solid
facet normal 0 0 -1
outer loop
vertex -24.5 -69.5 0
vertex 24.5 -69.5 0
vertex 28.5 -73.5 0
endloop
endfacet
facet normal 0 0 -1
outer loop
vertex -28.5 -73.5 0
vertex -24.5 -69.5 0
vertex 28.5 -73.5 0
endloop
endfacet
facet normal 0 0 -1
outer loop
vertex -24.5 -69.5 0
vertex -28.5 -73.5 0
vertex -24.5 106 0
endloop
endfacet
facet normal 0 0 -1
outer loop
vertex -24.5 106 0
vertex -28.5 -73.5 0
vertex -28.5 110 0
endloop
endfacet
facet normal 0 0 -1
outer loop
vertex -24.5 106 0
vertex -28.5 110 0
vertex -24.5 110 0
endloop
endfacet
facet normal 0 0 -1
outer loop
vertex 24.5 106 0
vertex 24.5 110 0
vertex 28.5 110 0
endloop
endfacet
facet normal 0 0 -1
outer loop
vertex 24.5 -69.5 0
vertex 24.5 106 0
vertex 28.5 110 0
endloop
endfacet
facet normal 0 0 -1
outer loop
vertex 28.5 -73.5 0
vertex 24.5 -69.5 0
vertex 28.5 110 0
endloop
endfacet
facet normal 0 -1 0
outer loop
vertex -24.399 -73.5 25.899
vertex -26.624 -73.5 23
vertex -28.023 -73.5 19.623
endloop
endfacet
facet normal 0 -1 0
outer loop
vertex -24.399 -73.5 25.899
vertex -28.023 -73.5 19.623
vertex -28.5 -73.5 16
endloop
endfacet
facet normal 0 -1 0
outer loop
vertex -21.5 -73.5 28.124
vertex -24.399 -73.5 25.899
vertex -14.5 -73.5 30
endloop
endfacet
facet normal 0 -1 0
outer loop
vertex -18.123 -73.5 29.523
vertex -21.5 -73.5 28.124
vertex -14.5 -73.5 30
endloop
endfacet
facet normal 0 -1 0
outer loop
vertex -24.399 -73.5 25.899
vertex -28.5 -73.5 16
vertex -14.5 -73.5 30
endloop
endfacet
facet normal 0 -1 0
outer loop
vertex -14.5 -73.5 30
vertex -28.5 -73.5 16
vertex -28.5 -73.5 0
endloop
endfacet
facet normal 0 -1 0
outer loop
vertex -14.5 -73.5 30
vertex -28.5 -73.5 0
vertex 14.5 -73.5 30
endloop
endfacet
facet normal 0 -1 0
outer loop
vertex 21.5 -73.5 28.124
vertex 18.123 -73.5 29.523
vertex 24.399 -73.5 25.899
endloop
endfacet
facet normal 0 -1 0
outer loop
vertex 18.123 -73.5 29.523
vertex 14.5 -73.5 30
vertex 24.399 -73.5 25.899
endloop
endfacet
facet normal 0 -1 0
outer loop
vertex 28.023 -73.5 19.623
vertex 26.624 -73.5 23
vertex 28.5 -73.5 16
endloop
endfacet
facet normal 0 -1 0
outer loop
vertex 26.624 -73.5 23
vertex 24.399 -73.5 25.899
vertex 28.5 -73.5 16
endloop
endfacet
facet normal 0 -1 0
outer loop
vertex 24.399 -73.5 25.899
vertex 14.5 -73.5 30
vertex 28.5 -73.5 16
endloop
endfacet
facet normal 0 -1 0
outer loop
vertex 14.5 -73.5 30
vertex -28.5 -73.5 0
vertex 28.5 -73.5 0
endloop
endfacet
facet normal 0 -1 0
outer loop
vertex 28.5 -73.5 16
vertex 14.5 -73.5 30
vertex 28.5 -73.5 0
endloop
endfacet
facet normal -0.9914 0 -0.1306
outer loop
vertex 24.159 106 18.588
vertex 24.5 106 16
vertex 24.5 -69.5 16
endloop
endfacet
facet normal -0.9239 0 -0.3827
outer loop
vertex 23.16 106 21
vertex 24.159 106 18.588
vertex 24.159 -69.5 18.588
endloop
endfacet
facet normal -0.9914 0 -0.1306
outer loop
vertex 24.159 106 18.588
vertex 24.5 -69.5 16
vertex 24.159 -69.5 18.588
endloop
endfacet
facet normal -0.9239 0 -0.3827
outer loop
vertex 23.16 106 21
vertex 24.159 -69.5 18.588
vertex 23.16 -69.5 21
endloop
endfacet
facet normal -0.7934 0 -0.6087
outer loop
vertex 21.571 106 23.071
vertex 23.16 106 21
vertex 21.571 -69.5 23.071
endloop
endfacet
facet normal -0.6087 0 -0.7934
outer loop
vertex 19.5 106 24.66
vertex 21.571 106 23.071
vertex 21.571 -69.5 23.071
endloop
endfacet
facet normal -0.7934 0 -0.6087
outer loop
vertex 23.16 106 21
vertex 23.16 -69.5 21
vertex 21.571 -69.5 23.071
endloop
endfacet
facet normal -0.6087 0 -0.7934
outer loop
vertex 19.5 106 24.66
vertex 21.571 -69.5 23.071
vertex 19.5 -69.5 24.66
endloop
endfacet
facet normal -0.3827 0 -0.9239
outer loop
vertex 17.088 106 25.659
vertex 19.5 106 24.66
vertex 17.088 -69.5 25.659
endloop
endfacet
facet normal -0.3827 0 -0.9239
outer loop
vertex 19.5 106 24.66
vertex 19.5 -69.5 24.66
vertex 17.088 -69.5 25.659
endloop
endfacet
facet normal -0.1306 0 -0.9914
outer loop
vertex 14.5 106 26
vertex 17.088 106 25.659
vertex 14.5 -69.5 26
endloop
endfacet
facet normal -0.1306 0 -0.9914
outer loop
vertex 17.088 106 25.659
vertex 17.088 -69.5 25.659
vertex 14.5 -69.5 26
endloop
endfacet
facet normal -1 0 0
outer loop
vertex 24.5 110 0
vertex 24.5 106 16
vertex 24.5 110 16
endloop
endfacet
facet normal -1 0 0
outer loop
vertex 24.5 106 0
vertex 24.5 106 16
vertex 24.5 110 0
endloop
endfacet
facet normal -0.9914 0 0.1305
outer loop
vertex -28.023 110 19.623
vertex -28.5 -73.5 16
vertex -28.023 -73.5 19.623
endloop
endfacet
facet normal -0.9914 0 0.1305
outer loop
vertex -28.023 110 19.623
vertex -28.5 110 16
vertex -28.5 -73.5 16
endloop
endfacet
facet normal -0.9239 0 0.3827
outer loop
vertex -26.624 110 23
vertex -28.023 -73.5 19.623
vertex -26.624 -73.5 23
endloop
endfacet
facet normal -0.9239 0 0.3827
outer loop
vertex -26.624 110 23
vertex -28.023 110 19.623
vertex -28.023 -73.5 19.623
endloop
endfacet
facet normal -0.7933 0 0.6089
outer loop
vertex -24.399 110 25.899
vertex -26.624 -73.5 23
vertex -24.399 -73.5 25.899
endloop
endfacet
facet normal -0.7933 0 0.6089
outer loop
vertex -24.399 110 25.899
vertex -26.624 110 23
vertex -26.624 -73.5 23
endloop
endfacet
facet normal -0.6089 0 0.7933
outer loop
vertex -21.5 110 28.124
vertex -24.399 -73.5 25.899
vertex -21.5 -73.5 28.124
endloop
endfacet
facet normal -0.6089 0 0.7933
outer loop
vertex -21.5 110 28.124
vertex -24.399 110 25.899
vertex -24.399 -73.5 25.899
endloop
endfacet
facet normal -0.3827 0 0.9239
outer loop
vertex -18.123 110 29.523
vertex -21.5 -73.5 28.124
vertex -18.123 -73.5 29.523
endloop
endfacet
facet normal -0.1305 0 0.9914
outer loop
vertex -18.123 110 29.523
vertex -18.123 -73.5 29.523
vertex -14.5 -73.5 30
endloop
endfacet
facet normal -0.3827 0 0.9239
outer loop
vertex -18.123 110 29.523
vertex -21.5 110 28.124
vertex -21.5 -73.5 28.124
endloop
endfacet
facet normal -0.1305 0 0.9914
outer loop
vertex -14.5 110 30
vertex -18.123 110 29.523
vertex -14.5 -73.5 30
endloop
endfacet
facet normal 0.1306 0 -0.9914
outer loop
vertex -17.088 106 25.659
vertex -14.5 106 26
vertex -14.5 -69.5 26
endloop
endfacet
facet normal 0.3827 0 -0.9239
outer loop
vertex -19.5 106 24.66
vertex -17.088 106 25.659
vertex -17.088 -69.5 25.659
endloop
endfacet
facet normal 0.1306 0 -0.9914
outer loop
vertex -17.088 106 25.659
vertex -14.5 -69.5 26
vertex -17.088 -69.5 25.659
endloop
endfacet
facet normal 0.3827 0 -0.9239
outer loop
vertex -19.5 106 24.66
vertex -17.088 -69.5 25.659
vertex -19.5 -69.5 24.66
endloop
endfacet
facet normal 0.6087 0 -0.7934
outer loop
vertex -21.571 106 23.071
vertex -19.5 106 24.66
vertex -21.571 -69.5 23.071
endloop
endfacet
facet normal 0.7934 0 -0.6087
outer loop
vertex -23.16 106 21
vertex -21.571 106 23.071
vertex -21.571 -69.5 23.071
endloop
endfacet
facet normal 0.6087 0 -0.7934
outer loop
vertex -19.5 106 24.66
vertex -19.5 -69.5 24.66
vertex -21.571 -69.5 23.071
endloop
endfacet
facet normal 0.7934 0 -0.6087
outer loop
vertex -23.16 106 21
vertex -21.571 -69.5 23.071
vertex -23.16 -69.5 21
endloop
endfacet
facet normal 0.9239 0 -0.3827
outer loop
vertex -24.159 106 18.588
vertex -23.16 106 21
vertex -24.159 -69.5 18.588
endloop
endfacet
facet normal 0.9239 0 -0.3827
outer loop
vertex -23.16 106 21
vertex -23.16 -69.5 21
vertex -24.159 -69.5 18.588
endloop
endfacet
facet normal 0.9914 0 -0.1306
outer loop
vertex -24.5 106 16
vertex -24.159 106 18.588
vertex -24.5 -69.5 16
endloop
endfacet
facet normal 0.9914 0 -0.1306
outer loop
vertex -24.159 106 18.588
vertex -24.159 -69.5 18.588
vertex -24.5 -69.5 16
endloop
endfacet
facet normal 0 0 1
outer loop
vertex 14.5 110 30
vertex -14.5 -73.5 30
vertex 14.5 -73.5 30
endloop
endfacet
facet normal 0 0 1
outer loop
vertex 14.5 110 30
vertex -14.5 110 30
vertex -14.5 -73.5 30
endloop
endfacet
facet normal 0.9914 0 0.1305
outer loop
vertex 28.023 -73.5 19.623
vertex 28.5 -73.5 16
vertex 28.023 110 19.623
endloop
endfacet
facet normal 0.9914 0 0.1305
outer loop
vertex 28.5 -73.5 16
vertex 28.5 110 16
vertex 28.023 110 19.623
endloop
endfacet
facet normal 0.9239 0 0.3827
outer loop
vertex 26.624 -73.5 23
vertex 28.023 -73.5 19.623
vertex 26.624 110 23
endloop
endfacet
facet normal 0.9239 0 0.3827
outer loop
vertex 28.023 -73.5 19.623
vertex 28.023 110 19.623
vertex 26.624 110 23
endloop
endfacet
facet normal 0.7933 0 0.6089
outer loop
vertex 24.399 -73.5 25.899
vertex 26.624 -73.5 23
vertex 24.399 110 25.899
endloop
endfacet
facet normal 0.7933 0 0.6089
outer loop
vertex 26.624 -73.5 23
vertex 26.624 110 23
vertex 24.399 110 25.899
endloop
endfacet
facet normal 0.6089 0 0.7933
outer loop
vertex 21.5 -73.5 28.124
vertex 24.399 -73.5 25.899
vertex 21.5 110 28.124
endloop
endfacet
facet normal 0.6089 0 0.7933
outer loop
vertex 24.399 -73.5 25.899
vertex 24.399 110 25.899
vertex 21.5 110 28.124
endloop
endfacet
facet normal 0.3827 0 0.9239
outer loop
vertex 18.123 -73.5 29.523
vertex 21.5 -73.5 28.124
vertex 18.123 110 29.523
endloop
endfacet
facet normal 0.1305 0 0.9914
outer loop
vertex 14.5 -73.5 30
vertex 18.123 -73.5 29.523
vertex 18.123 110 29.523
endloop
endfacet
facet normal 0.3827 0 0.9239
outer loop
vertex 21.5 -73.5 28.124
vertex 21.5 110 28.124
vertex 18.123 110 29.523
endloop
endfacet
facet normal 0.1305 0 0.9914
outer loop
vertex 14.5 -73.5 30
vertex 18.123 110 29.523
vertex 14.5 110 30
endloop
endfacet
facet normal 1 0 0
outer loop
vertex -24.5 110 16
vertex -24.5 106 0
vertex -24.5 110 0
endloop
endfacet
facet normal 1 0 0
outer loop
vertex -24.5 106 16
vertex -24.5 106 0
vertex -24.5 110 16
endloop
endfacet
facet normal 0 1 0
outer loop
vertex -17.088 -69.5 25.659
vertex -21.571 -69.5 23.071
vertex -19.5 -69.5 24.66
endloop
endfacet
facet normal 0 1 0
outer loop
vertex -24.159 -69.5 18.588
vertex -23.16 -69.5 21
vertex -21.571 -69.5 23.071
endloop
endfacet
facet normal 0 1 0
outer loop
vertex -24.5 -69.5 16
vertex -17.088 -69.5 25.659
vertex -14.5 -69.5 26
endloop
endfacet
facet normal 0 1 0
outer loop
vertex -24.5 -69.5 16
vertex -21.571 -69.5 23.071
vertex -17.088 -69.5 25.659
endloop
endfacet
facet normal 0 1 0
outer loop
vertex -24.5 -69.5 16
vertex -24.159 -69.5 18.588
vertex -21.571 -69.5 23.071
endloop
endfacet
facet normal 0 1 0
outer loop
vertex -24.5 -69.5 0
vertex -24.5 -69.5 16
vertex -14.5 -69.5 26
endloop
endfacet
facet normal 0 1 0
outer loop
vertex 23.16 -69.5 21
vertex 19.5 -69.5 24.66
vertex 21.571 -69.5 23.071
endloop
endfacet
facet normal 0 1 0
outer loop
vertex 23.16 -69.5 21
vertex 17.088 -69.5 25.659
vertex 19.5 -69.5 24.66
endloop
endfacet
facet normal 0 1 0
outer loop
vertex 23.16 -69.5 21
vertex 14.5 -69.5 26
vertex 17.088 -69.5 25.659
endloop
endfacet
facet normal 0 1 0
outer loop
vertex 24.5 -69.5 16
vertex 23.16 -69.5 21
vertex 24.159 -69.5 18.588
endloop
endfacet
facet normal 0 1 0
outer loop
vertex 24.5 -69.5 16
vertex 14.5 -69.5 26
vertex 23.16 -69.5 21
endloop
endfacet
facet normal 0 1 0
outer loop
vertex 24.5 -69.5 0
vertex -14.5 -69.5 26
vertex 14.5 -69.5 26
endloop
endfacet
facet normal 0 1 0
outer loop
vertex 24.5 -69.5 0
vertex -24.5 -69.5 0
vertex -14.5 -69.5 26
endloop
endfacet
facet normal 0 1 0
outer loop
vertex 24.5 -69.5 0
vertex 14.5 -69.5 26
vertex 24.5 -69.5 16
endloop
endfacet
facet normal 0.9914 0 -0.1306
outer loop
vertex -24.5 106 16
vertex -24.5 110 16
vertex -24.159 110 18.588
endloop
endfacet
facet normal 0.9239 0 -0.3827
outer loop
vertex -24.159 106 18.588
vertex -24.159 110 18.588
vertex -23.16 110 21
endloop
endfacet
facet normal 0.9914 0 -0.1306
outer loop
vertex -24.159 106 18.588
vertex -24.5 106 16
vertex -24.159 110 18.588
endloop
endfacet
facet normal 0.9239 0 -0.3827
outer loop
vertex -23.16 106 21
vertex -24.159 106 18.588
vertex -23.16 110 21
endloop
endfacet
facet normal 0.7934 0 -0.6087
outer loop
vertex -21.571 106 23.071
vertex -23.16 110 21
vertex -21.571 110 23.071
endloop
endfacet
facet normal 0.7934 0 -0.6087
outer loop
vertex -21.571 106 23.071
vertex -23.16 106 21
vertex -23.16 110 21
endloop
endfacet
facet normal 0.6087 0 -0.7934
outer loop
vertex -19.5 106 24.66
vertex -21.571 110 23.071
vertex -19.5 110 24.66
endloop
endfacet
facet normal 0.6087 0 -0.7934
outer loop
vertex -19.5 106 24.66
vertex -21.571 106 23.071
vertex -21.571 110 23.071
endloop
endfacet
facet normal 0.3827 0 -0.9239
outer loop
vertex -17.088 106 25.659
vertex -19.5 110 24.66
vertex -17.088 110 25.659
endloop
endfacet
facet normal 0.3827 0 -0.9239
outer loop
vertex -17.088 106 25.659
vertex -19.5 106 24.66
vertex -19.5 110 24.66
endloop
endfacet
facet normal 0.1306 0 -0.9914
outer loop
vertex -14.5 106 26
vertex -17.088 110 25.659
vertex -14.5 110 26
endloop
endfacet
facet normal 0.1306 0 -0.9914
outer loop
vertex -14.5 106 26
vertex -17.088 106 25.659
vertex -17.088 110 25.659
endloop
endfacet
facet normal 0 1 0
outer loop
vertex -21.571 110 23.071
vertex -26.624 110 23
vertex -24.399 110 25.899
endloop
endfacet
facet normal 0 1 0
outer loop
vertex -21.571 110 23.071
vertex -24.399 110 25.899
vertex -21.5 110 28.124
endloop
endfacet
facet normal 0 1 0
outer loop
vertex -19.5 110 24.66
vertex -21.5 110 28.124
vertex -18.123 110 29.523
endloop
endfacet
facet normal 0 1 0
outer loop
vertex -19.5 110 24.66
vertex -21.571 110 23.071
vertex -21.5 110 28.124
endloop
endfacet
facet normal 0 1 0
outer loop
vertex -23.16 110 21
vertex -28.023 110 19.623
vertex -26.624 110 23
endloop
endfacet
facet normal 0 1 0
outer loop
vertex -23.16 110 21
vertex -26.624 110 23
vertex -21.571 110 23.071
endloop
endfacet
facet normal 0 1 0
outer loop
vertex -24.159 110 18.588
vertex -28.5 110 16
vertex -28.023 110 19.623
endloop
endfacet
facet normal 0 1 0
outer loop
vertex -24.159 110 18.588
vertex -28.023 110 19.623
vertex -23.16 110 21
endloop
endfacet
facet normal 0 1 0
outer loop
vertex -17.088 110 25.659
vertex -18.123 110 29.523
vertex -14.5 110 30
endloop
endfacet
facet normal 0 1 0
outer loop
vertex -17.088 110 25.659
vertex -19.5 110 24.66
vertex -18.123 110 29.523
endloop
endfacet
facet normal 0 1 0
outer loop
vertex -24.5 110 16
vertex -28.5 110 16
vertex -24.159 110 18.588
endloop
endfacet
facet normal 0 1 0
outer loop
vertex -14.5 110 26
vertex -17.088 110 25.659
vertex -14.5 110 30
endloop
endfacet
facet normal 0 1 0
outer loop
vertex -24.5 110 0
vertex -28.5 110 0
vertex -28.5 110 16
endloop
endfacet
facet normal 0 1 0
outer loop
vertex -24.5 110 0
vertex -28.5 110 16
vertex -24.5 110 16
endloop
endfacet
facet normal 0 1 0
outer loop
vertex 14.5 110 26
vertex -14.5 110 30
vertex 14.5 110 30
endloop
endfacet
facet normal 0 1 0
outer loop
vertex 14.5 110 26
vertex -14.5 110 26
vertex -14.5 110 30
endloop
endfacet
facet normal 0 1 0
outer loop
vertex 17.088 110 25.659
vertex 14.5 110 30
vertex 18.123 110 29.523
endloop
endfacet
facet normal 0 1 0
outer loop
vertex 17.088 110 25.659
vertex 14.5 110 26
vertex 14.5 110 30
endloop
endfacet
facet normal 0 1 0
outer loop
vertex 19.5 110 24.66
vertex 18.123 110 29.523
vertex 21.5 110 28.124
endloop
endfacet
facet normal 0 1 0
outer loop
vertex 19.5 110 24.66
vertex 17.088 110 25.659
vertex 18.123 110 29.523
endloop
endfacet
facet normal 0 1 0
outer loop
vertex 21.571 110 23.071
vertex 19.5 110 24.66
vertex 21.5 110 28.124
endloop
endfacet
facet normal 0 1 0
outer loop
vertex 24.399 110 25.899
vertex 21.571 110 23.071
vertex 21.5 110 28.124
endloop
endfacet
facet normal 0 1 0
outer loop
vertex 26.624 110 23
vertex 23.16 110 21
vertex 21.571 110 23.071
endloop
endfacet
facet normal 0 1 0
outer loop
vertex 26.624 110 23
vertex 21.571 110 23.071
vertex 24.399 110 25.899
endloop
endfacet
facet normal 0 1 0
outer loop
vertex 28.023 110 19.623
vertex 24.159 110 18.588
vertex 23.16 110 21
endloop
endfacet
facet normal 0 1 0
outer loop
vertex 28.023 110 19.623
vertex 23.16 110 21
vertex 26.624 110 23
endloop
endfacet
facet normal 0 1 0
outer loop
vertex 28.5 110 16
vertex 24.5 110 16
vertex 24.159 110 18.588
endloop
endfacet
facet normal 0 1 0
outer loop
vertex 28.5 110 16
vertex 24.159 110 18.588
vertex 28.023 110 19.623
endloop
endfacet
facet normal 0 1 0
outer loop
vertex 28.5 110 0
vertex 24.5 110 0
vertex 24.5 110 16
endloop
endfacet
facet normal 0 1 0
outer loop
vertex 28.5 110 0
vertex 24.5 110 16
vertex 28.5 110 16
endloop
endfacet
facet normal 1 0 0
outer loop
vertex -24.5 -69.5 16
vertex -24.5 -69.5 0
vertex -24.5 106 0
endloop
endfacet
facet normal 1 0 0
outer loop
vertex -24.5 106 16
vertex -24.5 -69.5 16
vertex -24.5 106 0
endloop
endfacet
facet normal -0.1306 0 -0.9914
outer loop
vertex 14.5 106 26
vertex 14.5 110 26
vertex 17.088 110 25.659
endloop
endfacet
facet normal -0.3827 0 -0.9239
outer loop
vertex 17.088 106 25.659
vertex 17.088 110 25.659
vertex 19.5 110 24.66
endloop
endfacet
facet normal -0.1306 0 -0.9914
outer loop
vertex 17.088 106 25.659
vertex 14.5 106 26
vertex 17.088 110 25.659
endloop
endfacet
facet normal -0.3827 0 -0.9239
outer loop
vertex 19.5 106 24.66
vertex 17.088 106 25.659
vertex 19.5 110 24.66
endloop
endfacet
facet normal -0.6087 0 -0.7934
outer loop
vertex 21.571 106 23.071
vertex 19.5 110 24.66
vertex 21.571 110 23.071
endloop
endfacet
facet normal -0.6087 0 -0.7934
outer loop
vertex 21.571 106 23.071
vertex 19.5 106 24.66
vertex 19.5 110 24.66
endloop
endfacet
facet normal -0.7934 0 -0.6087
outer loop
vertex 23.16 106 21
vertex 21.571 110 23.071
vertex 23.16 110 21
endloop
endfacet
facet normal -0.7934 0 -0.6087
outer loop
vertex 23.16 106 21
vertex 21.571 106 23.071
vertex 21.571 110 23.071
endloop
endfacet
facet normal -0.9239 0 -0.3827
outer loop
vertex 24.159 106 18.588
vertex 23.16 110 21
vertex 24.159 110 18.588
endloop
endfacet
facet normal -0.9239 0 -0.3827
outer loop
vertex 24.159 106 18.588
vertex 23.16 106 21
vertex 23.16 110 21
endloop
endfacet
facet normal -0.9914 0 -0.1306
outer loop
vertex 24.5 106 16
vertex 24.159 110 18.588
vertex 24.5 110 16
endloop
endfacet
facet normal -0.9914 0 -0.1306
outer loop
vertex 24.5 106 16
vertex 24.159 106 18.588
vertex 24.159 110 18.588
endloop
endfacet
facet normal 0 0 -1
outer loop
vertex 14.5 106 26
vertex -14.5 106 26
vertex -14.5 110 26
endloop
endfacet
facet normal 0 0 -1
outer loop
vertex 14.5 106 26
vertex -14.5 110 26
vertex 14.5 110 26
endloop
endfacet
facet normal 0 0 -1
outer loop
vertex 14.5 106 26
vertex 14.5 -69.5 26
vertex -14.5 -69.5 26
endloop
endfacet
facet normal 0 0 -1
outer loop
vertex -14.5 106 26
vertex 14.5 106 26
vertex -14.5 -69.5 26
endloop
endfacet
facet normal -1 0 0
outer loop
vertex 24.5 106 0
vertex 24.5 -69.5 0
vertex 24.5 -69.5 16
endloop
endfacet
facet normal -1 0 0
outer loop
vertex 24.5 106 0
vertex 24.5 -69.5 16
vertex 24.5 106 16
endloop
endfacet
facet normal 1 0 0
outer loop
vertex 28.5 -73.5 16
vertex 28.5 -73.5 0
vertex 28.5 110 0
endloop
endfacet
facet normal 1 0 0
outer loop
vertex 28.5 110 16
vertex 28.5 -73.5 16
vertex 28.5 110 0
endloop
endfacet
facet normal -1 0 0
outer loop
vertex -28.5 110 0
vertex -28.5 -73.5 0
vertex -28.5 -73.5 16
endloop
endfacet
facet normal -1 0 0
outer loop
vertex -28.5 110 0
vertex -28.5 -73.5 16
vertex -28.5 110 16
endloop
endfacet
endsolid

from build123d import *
from build123d.topology import SkipClean

# Parameters (mm, degrees)
SKETCH1_W           = 57
SKETCH1_H           = 183.5
SKETCH1_W_2         = 49
SKETCH1_H_2         = 175.5
BOSS_EXTRUDE1_DEPTH = 30
BOSS_EXTRUDE2_DEPTH = 175.5
FILLET1_R           = 14
CUT_EXTRUDE1_DEPTH  = 179.5


with BuildPart() as part:
    # Sketch1 → Boss-Extrude1 (new body)
    with BuildSketch(Plane.XY):
        with Locations((0, 18.25)):
            Rectangle(SKETCH1_W, SKETCH1_H)
        with Locations((0, 18.25)):
            Rectangle(SKETCH1_W_2, SKETCH1_H_2, mode=Mode.SUBTRACT)
    extrude(amount=BOSS_EXTRUDE1_DEPTH)

    # Sketch2 → Boss-Extrude2 (add)
    with BuildSketch(Plane(origin=(0, -69.5, 0), x_dir=(1, 0, 0), z_dir=(0, 1, 0))):
        with BuildLine():
            Line((14.5, -26), (24.5, -26))
            Line((24.5, -26), (24.5, -16))
            ThreePointArc((24.5, -16), (21.571067812, -23.071067812), (14.5, -26))
        make_face()
        Polygon((-24.5, -30), (24.5, -30), (24.5, -26), (14.5, -26), (-14.5, -26), (-24.5, -26), align=None)
        with BuildLine():
            Line((-24.5, -16), (-24.5, -26))
            Line((-24.5, -26), (-14.5, -26))
            ThreePointArc((-14.5, -26), (-21.571067812, -23.071067812), (-24.5, -16))
        make_face()
    extrude(amount=BOSS_EXTRUDE2_DEPTH)

    # Fillet1
    fillet1_edges = [part.edges().sort_by_distance(p)[0] for p in [
        (-28.5, 18.25, 30),
        (28.5, 18.25, 30),
    ]]
    fillet(fillet1_edges, radius=FILLET1_R)

    # Sketch2<4> → Cut-Extrude1 (cut)
    with SkipClean():  # the faces are left unmerged after this step: merging them gives an invalid solid
        with BuildSketch(Plane(origin=(0, -69.5, 0), x_dir=(1, 0, 0), z_dir=(0, 1, 0))):
            with BuildLine():
                Line((-14.5, -26), (14.5, -26))
                ThreePointArc((14.5, -26), (21.571067812, -23.071067812), (24.5, -16))
                Line((24.5, -16), (24.5, 0))
                Line((24.5, 0), (-24.5, 0))
                Line((-24.5, 0), (-24.5, -16))
                ThreePointArc((-24.5, -16), (-21.571067812, -23.071067812), (-14.5, -26))
            make_face()
        extrude(amount=CUT_EXTRUDE1_DEPTH, mode=Mode.SUBTRACT)


solid = part.part
